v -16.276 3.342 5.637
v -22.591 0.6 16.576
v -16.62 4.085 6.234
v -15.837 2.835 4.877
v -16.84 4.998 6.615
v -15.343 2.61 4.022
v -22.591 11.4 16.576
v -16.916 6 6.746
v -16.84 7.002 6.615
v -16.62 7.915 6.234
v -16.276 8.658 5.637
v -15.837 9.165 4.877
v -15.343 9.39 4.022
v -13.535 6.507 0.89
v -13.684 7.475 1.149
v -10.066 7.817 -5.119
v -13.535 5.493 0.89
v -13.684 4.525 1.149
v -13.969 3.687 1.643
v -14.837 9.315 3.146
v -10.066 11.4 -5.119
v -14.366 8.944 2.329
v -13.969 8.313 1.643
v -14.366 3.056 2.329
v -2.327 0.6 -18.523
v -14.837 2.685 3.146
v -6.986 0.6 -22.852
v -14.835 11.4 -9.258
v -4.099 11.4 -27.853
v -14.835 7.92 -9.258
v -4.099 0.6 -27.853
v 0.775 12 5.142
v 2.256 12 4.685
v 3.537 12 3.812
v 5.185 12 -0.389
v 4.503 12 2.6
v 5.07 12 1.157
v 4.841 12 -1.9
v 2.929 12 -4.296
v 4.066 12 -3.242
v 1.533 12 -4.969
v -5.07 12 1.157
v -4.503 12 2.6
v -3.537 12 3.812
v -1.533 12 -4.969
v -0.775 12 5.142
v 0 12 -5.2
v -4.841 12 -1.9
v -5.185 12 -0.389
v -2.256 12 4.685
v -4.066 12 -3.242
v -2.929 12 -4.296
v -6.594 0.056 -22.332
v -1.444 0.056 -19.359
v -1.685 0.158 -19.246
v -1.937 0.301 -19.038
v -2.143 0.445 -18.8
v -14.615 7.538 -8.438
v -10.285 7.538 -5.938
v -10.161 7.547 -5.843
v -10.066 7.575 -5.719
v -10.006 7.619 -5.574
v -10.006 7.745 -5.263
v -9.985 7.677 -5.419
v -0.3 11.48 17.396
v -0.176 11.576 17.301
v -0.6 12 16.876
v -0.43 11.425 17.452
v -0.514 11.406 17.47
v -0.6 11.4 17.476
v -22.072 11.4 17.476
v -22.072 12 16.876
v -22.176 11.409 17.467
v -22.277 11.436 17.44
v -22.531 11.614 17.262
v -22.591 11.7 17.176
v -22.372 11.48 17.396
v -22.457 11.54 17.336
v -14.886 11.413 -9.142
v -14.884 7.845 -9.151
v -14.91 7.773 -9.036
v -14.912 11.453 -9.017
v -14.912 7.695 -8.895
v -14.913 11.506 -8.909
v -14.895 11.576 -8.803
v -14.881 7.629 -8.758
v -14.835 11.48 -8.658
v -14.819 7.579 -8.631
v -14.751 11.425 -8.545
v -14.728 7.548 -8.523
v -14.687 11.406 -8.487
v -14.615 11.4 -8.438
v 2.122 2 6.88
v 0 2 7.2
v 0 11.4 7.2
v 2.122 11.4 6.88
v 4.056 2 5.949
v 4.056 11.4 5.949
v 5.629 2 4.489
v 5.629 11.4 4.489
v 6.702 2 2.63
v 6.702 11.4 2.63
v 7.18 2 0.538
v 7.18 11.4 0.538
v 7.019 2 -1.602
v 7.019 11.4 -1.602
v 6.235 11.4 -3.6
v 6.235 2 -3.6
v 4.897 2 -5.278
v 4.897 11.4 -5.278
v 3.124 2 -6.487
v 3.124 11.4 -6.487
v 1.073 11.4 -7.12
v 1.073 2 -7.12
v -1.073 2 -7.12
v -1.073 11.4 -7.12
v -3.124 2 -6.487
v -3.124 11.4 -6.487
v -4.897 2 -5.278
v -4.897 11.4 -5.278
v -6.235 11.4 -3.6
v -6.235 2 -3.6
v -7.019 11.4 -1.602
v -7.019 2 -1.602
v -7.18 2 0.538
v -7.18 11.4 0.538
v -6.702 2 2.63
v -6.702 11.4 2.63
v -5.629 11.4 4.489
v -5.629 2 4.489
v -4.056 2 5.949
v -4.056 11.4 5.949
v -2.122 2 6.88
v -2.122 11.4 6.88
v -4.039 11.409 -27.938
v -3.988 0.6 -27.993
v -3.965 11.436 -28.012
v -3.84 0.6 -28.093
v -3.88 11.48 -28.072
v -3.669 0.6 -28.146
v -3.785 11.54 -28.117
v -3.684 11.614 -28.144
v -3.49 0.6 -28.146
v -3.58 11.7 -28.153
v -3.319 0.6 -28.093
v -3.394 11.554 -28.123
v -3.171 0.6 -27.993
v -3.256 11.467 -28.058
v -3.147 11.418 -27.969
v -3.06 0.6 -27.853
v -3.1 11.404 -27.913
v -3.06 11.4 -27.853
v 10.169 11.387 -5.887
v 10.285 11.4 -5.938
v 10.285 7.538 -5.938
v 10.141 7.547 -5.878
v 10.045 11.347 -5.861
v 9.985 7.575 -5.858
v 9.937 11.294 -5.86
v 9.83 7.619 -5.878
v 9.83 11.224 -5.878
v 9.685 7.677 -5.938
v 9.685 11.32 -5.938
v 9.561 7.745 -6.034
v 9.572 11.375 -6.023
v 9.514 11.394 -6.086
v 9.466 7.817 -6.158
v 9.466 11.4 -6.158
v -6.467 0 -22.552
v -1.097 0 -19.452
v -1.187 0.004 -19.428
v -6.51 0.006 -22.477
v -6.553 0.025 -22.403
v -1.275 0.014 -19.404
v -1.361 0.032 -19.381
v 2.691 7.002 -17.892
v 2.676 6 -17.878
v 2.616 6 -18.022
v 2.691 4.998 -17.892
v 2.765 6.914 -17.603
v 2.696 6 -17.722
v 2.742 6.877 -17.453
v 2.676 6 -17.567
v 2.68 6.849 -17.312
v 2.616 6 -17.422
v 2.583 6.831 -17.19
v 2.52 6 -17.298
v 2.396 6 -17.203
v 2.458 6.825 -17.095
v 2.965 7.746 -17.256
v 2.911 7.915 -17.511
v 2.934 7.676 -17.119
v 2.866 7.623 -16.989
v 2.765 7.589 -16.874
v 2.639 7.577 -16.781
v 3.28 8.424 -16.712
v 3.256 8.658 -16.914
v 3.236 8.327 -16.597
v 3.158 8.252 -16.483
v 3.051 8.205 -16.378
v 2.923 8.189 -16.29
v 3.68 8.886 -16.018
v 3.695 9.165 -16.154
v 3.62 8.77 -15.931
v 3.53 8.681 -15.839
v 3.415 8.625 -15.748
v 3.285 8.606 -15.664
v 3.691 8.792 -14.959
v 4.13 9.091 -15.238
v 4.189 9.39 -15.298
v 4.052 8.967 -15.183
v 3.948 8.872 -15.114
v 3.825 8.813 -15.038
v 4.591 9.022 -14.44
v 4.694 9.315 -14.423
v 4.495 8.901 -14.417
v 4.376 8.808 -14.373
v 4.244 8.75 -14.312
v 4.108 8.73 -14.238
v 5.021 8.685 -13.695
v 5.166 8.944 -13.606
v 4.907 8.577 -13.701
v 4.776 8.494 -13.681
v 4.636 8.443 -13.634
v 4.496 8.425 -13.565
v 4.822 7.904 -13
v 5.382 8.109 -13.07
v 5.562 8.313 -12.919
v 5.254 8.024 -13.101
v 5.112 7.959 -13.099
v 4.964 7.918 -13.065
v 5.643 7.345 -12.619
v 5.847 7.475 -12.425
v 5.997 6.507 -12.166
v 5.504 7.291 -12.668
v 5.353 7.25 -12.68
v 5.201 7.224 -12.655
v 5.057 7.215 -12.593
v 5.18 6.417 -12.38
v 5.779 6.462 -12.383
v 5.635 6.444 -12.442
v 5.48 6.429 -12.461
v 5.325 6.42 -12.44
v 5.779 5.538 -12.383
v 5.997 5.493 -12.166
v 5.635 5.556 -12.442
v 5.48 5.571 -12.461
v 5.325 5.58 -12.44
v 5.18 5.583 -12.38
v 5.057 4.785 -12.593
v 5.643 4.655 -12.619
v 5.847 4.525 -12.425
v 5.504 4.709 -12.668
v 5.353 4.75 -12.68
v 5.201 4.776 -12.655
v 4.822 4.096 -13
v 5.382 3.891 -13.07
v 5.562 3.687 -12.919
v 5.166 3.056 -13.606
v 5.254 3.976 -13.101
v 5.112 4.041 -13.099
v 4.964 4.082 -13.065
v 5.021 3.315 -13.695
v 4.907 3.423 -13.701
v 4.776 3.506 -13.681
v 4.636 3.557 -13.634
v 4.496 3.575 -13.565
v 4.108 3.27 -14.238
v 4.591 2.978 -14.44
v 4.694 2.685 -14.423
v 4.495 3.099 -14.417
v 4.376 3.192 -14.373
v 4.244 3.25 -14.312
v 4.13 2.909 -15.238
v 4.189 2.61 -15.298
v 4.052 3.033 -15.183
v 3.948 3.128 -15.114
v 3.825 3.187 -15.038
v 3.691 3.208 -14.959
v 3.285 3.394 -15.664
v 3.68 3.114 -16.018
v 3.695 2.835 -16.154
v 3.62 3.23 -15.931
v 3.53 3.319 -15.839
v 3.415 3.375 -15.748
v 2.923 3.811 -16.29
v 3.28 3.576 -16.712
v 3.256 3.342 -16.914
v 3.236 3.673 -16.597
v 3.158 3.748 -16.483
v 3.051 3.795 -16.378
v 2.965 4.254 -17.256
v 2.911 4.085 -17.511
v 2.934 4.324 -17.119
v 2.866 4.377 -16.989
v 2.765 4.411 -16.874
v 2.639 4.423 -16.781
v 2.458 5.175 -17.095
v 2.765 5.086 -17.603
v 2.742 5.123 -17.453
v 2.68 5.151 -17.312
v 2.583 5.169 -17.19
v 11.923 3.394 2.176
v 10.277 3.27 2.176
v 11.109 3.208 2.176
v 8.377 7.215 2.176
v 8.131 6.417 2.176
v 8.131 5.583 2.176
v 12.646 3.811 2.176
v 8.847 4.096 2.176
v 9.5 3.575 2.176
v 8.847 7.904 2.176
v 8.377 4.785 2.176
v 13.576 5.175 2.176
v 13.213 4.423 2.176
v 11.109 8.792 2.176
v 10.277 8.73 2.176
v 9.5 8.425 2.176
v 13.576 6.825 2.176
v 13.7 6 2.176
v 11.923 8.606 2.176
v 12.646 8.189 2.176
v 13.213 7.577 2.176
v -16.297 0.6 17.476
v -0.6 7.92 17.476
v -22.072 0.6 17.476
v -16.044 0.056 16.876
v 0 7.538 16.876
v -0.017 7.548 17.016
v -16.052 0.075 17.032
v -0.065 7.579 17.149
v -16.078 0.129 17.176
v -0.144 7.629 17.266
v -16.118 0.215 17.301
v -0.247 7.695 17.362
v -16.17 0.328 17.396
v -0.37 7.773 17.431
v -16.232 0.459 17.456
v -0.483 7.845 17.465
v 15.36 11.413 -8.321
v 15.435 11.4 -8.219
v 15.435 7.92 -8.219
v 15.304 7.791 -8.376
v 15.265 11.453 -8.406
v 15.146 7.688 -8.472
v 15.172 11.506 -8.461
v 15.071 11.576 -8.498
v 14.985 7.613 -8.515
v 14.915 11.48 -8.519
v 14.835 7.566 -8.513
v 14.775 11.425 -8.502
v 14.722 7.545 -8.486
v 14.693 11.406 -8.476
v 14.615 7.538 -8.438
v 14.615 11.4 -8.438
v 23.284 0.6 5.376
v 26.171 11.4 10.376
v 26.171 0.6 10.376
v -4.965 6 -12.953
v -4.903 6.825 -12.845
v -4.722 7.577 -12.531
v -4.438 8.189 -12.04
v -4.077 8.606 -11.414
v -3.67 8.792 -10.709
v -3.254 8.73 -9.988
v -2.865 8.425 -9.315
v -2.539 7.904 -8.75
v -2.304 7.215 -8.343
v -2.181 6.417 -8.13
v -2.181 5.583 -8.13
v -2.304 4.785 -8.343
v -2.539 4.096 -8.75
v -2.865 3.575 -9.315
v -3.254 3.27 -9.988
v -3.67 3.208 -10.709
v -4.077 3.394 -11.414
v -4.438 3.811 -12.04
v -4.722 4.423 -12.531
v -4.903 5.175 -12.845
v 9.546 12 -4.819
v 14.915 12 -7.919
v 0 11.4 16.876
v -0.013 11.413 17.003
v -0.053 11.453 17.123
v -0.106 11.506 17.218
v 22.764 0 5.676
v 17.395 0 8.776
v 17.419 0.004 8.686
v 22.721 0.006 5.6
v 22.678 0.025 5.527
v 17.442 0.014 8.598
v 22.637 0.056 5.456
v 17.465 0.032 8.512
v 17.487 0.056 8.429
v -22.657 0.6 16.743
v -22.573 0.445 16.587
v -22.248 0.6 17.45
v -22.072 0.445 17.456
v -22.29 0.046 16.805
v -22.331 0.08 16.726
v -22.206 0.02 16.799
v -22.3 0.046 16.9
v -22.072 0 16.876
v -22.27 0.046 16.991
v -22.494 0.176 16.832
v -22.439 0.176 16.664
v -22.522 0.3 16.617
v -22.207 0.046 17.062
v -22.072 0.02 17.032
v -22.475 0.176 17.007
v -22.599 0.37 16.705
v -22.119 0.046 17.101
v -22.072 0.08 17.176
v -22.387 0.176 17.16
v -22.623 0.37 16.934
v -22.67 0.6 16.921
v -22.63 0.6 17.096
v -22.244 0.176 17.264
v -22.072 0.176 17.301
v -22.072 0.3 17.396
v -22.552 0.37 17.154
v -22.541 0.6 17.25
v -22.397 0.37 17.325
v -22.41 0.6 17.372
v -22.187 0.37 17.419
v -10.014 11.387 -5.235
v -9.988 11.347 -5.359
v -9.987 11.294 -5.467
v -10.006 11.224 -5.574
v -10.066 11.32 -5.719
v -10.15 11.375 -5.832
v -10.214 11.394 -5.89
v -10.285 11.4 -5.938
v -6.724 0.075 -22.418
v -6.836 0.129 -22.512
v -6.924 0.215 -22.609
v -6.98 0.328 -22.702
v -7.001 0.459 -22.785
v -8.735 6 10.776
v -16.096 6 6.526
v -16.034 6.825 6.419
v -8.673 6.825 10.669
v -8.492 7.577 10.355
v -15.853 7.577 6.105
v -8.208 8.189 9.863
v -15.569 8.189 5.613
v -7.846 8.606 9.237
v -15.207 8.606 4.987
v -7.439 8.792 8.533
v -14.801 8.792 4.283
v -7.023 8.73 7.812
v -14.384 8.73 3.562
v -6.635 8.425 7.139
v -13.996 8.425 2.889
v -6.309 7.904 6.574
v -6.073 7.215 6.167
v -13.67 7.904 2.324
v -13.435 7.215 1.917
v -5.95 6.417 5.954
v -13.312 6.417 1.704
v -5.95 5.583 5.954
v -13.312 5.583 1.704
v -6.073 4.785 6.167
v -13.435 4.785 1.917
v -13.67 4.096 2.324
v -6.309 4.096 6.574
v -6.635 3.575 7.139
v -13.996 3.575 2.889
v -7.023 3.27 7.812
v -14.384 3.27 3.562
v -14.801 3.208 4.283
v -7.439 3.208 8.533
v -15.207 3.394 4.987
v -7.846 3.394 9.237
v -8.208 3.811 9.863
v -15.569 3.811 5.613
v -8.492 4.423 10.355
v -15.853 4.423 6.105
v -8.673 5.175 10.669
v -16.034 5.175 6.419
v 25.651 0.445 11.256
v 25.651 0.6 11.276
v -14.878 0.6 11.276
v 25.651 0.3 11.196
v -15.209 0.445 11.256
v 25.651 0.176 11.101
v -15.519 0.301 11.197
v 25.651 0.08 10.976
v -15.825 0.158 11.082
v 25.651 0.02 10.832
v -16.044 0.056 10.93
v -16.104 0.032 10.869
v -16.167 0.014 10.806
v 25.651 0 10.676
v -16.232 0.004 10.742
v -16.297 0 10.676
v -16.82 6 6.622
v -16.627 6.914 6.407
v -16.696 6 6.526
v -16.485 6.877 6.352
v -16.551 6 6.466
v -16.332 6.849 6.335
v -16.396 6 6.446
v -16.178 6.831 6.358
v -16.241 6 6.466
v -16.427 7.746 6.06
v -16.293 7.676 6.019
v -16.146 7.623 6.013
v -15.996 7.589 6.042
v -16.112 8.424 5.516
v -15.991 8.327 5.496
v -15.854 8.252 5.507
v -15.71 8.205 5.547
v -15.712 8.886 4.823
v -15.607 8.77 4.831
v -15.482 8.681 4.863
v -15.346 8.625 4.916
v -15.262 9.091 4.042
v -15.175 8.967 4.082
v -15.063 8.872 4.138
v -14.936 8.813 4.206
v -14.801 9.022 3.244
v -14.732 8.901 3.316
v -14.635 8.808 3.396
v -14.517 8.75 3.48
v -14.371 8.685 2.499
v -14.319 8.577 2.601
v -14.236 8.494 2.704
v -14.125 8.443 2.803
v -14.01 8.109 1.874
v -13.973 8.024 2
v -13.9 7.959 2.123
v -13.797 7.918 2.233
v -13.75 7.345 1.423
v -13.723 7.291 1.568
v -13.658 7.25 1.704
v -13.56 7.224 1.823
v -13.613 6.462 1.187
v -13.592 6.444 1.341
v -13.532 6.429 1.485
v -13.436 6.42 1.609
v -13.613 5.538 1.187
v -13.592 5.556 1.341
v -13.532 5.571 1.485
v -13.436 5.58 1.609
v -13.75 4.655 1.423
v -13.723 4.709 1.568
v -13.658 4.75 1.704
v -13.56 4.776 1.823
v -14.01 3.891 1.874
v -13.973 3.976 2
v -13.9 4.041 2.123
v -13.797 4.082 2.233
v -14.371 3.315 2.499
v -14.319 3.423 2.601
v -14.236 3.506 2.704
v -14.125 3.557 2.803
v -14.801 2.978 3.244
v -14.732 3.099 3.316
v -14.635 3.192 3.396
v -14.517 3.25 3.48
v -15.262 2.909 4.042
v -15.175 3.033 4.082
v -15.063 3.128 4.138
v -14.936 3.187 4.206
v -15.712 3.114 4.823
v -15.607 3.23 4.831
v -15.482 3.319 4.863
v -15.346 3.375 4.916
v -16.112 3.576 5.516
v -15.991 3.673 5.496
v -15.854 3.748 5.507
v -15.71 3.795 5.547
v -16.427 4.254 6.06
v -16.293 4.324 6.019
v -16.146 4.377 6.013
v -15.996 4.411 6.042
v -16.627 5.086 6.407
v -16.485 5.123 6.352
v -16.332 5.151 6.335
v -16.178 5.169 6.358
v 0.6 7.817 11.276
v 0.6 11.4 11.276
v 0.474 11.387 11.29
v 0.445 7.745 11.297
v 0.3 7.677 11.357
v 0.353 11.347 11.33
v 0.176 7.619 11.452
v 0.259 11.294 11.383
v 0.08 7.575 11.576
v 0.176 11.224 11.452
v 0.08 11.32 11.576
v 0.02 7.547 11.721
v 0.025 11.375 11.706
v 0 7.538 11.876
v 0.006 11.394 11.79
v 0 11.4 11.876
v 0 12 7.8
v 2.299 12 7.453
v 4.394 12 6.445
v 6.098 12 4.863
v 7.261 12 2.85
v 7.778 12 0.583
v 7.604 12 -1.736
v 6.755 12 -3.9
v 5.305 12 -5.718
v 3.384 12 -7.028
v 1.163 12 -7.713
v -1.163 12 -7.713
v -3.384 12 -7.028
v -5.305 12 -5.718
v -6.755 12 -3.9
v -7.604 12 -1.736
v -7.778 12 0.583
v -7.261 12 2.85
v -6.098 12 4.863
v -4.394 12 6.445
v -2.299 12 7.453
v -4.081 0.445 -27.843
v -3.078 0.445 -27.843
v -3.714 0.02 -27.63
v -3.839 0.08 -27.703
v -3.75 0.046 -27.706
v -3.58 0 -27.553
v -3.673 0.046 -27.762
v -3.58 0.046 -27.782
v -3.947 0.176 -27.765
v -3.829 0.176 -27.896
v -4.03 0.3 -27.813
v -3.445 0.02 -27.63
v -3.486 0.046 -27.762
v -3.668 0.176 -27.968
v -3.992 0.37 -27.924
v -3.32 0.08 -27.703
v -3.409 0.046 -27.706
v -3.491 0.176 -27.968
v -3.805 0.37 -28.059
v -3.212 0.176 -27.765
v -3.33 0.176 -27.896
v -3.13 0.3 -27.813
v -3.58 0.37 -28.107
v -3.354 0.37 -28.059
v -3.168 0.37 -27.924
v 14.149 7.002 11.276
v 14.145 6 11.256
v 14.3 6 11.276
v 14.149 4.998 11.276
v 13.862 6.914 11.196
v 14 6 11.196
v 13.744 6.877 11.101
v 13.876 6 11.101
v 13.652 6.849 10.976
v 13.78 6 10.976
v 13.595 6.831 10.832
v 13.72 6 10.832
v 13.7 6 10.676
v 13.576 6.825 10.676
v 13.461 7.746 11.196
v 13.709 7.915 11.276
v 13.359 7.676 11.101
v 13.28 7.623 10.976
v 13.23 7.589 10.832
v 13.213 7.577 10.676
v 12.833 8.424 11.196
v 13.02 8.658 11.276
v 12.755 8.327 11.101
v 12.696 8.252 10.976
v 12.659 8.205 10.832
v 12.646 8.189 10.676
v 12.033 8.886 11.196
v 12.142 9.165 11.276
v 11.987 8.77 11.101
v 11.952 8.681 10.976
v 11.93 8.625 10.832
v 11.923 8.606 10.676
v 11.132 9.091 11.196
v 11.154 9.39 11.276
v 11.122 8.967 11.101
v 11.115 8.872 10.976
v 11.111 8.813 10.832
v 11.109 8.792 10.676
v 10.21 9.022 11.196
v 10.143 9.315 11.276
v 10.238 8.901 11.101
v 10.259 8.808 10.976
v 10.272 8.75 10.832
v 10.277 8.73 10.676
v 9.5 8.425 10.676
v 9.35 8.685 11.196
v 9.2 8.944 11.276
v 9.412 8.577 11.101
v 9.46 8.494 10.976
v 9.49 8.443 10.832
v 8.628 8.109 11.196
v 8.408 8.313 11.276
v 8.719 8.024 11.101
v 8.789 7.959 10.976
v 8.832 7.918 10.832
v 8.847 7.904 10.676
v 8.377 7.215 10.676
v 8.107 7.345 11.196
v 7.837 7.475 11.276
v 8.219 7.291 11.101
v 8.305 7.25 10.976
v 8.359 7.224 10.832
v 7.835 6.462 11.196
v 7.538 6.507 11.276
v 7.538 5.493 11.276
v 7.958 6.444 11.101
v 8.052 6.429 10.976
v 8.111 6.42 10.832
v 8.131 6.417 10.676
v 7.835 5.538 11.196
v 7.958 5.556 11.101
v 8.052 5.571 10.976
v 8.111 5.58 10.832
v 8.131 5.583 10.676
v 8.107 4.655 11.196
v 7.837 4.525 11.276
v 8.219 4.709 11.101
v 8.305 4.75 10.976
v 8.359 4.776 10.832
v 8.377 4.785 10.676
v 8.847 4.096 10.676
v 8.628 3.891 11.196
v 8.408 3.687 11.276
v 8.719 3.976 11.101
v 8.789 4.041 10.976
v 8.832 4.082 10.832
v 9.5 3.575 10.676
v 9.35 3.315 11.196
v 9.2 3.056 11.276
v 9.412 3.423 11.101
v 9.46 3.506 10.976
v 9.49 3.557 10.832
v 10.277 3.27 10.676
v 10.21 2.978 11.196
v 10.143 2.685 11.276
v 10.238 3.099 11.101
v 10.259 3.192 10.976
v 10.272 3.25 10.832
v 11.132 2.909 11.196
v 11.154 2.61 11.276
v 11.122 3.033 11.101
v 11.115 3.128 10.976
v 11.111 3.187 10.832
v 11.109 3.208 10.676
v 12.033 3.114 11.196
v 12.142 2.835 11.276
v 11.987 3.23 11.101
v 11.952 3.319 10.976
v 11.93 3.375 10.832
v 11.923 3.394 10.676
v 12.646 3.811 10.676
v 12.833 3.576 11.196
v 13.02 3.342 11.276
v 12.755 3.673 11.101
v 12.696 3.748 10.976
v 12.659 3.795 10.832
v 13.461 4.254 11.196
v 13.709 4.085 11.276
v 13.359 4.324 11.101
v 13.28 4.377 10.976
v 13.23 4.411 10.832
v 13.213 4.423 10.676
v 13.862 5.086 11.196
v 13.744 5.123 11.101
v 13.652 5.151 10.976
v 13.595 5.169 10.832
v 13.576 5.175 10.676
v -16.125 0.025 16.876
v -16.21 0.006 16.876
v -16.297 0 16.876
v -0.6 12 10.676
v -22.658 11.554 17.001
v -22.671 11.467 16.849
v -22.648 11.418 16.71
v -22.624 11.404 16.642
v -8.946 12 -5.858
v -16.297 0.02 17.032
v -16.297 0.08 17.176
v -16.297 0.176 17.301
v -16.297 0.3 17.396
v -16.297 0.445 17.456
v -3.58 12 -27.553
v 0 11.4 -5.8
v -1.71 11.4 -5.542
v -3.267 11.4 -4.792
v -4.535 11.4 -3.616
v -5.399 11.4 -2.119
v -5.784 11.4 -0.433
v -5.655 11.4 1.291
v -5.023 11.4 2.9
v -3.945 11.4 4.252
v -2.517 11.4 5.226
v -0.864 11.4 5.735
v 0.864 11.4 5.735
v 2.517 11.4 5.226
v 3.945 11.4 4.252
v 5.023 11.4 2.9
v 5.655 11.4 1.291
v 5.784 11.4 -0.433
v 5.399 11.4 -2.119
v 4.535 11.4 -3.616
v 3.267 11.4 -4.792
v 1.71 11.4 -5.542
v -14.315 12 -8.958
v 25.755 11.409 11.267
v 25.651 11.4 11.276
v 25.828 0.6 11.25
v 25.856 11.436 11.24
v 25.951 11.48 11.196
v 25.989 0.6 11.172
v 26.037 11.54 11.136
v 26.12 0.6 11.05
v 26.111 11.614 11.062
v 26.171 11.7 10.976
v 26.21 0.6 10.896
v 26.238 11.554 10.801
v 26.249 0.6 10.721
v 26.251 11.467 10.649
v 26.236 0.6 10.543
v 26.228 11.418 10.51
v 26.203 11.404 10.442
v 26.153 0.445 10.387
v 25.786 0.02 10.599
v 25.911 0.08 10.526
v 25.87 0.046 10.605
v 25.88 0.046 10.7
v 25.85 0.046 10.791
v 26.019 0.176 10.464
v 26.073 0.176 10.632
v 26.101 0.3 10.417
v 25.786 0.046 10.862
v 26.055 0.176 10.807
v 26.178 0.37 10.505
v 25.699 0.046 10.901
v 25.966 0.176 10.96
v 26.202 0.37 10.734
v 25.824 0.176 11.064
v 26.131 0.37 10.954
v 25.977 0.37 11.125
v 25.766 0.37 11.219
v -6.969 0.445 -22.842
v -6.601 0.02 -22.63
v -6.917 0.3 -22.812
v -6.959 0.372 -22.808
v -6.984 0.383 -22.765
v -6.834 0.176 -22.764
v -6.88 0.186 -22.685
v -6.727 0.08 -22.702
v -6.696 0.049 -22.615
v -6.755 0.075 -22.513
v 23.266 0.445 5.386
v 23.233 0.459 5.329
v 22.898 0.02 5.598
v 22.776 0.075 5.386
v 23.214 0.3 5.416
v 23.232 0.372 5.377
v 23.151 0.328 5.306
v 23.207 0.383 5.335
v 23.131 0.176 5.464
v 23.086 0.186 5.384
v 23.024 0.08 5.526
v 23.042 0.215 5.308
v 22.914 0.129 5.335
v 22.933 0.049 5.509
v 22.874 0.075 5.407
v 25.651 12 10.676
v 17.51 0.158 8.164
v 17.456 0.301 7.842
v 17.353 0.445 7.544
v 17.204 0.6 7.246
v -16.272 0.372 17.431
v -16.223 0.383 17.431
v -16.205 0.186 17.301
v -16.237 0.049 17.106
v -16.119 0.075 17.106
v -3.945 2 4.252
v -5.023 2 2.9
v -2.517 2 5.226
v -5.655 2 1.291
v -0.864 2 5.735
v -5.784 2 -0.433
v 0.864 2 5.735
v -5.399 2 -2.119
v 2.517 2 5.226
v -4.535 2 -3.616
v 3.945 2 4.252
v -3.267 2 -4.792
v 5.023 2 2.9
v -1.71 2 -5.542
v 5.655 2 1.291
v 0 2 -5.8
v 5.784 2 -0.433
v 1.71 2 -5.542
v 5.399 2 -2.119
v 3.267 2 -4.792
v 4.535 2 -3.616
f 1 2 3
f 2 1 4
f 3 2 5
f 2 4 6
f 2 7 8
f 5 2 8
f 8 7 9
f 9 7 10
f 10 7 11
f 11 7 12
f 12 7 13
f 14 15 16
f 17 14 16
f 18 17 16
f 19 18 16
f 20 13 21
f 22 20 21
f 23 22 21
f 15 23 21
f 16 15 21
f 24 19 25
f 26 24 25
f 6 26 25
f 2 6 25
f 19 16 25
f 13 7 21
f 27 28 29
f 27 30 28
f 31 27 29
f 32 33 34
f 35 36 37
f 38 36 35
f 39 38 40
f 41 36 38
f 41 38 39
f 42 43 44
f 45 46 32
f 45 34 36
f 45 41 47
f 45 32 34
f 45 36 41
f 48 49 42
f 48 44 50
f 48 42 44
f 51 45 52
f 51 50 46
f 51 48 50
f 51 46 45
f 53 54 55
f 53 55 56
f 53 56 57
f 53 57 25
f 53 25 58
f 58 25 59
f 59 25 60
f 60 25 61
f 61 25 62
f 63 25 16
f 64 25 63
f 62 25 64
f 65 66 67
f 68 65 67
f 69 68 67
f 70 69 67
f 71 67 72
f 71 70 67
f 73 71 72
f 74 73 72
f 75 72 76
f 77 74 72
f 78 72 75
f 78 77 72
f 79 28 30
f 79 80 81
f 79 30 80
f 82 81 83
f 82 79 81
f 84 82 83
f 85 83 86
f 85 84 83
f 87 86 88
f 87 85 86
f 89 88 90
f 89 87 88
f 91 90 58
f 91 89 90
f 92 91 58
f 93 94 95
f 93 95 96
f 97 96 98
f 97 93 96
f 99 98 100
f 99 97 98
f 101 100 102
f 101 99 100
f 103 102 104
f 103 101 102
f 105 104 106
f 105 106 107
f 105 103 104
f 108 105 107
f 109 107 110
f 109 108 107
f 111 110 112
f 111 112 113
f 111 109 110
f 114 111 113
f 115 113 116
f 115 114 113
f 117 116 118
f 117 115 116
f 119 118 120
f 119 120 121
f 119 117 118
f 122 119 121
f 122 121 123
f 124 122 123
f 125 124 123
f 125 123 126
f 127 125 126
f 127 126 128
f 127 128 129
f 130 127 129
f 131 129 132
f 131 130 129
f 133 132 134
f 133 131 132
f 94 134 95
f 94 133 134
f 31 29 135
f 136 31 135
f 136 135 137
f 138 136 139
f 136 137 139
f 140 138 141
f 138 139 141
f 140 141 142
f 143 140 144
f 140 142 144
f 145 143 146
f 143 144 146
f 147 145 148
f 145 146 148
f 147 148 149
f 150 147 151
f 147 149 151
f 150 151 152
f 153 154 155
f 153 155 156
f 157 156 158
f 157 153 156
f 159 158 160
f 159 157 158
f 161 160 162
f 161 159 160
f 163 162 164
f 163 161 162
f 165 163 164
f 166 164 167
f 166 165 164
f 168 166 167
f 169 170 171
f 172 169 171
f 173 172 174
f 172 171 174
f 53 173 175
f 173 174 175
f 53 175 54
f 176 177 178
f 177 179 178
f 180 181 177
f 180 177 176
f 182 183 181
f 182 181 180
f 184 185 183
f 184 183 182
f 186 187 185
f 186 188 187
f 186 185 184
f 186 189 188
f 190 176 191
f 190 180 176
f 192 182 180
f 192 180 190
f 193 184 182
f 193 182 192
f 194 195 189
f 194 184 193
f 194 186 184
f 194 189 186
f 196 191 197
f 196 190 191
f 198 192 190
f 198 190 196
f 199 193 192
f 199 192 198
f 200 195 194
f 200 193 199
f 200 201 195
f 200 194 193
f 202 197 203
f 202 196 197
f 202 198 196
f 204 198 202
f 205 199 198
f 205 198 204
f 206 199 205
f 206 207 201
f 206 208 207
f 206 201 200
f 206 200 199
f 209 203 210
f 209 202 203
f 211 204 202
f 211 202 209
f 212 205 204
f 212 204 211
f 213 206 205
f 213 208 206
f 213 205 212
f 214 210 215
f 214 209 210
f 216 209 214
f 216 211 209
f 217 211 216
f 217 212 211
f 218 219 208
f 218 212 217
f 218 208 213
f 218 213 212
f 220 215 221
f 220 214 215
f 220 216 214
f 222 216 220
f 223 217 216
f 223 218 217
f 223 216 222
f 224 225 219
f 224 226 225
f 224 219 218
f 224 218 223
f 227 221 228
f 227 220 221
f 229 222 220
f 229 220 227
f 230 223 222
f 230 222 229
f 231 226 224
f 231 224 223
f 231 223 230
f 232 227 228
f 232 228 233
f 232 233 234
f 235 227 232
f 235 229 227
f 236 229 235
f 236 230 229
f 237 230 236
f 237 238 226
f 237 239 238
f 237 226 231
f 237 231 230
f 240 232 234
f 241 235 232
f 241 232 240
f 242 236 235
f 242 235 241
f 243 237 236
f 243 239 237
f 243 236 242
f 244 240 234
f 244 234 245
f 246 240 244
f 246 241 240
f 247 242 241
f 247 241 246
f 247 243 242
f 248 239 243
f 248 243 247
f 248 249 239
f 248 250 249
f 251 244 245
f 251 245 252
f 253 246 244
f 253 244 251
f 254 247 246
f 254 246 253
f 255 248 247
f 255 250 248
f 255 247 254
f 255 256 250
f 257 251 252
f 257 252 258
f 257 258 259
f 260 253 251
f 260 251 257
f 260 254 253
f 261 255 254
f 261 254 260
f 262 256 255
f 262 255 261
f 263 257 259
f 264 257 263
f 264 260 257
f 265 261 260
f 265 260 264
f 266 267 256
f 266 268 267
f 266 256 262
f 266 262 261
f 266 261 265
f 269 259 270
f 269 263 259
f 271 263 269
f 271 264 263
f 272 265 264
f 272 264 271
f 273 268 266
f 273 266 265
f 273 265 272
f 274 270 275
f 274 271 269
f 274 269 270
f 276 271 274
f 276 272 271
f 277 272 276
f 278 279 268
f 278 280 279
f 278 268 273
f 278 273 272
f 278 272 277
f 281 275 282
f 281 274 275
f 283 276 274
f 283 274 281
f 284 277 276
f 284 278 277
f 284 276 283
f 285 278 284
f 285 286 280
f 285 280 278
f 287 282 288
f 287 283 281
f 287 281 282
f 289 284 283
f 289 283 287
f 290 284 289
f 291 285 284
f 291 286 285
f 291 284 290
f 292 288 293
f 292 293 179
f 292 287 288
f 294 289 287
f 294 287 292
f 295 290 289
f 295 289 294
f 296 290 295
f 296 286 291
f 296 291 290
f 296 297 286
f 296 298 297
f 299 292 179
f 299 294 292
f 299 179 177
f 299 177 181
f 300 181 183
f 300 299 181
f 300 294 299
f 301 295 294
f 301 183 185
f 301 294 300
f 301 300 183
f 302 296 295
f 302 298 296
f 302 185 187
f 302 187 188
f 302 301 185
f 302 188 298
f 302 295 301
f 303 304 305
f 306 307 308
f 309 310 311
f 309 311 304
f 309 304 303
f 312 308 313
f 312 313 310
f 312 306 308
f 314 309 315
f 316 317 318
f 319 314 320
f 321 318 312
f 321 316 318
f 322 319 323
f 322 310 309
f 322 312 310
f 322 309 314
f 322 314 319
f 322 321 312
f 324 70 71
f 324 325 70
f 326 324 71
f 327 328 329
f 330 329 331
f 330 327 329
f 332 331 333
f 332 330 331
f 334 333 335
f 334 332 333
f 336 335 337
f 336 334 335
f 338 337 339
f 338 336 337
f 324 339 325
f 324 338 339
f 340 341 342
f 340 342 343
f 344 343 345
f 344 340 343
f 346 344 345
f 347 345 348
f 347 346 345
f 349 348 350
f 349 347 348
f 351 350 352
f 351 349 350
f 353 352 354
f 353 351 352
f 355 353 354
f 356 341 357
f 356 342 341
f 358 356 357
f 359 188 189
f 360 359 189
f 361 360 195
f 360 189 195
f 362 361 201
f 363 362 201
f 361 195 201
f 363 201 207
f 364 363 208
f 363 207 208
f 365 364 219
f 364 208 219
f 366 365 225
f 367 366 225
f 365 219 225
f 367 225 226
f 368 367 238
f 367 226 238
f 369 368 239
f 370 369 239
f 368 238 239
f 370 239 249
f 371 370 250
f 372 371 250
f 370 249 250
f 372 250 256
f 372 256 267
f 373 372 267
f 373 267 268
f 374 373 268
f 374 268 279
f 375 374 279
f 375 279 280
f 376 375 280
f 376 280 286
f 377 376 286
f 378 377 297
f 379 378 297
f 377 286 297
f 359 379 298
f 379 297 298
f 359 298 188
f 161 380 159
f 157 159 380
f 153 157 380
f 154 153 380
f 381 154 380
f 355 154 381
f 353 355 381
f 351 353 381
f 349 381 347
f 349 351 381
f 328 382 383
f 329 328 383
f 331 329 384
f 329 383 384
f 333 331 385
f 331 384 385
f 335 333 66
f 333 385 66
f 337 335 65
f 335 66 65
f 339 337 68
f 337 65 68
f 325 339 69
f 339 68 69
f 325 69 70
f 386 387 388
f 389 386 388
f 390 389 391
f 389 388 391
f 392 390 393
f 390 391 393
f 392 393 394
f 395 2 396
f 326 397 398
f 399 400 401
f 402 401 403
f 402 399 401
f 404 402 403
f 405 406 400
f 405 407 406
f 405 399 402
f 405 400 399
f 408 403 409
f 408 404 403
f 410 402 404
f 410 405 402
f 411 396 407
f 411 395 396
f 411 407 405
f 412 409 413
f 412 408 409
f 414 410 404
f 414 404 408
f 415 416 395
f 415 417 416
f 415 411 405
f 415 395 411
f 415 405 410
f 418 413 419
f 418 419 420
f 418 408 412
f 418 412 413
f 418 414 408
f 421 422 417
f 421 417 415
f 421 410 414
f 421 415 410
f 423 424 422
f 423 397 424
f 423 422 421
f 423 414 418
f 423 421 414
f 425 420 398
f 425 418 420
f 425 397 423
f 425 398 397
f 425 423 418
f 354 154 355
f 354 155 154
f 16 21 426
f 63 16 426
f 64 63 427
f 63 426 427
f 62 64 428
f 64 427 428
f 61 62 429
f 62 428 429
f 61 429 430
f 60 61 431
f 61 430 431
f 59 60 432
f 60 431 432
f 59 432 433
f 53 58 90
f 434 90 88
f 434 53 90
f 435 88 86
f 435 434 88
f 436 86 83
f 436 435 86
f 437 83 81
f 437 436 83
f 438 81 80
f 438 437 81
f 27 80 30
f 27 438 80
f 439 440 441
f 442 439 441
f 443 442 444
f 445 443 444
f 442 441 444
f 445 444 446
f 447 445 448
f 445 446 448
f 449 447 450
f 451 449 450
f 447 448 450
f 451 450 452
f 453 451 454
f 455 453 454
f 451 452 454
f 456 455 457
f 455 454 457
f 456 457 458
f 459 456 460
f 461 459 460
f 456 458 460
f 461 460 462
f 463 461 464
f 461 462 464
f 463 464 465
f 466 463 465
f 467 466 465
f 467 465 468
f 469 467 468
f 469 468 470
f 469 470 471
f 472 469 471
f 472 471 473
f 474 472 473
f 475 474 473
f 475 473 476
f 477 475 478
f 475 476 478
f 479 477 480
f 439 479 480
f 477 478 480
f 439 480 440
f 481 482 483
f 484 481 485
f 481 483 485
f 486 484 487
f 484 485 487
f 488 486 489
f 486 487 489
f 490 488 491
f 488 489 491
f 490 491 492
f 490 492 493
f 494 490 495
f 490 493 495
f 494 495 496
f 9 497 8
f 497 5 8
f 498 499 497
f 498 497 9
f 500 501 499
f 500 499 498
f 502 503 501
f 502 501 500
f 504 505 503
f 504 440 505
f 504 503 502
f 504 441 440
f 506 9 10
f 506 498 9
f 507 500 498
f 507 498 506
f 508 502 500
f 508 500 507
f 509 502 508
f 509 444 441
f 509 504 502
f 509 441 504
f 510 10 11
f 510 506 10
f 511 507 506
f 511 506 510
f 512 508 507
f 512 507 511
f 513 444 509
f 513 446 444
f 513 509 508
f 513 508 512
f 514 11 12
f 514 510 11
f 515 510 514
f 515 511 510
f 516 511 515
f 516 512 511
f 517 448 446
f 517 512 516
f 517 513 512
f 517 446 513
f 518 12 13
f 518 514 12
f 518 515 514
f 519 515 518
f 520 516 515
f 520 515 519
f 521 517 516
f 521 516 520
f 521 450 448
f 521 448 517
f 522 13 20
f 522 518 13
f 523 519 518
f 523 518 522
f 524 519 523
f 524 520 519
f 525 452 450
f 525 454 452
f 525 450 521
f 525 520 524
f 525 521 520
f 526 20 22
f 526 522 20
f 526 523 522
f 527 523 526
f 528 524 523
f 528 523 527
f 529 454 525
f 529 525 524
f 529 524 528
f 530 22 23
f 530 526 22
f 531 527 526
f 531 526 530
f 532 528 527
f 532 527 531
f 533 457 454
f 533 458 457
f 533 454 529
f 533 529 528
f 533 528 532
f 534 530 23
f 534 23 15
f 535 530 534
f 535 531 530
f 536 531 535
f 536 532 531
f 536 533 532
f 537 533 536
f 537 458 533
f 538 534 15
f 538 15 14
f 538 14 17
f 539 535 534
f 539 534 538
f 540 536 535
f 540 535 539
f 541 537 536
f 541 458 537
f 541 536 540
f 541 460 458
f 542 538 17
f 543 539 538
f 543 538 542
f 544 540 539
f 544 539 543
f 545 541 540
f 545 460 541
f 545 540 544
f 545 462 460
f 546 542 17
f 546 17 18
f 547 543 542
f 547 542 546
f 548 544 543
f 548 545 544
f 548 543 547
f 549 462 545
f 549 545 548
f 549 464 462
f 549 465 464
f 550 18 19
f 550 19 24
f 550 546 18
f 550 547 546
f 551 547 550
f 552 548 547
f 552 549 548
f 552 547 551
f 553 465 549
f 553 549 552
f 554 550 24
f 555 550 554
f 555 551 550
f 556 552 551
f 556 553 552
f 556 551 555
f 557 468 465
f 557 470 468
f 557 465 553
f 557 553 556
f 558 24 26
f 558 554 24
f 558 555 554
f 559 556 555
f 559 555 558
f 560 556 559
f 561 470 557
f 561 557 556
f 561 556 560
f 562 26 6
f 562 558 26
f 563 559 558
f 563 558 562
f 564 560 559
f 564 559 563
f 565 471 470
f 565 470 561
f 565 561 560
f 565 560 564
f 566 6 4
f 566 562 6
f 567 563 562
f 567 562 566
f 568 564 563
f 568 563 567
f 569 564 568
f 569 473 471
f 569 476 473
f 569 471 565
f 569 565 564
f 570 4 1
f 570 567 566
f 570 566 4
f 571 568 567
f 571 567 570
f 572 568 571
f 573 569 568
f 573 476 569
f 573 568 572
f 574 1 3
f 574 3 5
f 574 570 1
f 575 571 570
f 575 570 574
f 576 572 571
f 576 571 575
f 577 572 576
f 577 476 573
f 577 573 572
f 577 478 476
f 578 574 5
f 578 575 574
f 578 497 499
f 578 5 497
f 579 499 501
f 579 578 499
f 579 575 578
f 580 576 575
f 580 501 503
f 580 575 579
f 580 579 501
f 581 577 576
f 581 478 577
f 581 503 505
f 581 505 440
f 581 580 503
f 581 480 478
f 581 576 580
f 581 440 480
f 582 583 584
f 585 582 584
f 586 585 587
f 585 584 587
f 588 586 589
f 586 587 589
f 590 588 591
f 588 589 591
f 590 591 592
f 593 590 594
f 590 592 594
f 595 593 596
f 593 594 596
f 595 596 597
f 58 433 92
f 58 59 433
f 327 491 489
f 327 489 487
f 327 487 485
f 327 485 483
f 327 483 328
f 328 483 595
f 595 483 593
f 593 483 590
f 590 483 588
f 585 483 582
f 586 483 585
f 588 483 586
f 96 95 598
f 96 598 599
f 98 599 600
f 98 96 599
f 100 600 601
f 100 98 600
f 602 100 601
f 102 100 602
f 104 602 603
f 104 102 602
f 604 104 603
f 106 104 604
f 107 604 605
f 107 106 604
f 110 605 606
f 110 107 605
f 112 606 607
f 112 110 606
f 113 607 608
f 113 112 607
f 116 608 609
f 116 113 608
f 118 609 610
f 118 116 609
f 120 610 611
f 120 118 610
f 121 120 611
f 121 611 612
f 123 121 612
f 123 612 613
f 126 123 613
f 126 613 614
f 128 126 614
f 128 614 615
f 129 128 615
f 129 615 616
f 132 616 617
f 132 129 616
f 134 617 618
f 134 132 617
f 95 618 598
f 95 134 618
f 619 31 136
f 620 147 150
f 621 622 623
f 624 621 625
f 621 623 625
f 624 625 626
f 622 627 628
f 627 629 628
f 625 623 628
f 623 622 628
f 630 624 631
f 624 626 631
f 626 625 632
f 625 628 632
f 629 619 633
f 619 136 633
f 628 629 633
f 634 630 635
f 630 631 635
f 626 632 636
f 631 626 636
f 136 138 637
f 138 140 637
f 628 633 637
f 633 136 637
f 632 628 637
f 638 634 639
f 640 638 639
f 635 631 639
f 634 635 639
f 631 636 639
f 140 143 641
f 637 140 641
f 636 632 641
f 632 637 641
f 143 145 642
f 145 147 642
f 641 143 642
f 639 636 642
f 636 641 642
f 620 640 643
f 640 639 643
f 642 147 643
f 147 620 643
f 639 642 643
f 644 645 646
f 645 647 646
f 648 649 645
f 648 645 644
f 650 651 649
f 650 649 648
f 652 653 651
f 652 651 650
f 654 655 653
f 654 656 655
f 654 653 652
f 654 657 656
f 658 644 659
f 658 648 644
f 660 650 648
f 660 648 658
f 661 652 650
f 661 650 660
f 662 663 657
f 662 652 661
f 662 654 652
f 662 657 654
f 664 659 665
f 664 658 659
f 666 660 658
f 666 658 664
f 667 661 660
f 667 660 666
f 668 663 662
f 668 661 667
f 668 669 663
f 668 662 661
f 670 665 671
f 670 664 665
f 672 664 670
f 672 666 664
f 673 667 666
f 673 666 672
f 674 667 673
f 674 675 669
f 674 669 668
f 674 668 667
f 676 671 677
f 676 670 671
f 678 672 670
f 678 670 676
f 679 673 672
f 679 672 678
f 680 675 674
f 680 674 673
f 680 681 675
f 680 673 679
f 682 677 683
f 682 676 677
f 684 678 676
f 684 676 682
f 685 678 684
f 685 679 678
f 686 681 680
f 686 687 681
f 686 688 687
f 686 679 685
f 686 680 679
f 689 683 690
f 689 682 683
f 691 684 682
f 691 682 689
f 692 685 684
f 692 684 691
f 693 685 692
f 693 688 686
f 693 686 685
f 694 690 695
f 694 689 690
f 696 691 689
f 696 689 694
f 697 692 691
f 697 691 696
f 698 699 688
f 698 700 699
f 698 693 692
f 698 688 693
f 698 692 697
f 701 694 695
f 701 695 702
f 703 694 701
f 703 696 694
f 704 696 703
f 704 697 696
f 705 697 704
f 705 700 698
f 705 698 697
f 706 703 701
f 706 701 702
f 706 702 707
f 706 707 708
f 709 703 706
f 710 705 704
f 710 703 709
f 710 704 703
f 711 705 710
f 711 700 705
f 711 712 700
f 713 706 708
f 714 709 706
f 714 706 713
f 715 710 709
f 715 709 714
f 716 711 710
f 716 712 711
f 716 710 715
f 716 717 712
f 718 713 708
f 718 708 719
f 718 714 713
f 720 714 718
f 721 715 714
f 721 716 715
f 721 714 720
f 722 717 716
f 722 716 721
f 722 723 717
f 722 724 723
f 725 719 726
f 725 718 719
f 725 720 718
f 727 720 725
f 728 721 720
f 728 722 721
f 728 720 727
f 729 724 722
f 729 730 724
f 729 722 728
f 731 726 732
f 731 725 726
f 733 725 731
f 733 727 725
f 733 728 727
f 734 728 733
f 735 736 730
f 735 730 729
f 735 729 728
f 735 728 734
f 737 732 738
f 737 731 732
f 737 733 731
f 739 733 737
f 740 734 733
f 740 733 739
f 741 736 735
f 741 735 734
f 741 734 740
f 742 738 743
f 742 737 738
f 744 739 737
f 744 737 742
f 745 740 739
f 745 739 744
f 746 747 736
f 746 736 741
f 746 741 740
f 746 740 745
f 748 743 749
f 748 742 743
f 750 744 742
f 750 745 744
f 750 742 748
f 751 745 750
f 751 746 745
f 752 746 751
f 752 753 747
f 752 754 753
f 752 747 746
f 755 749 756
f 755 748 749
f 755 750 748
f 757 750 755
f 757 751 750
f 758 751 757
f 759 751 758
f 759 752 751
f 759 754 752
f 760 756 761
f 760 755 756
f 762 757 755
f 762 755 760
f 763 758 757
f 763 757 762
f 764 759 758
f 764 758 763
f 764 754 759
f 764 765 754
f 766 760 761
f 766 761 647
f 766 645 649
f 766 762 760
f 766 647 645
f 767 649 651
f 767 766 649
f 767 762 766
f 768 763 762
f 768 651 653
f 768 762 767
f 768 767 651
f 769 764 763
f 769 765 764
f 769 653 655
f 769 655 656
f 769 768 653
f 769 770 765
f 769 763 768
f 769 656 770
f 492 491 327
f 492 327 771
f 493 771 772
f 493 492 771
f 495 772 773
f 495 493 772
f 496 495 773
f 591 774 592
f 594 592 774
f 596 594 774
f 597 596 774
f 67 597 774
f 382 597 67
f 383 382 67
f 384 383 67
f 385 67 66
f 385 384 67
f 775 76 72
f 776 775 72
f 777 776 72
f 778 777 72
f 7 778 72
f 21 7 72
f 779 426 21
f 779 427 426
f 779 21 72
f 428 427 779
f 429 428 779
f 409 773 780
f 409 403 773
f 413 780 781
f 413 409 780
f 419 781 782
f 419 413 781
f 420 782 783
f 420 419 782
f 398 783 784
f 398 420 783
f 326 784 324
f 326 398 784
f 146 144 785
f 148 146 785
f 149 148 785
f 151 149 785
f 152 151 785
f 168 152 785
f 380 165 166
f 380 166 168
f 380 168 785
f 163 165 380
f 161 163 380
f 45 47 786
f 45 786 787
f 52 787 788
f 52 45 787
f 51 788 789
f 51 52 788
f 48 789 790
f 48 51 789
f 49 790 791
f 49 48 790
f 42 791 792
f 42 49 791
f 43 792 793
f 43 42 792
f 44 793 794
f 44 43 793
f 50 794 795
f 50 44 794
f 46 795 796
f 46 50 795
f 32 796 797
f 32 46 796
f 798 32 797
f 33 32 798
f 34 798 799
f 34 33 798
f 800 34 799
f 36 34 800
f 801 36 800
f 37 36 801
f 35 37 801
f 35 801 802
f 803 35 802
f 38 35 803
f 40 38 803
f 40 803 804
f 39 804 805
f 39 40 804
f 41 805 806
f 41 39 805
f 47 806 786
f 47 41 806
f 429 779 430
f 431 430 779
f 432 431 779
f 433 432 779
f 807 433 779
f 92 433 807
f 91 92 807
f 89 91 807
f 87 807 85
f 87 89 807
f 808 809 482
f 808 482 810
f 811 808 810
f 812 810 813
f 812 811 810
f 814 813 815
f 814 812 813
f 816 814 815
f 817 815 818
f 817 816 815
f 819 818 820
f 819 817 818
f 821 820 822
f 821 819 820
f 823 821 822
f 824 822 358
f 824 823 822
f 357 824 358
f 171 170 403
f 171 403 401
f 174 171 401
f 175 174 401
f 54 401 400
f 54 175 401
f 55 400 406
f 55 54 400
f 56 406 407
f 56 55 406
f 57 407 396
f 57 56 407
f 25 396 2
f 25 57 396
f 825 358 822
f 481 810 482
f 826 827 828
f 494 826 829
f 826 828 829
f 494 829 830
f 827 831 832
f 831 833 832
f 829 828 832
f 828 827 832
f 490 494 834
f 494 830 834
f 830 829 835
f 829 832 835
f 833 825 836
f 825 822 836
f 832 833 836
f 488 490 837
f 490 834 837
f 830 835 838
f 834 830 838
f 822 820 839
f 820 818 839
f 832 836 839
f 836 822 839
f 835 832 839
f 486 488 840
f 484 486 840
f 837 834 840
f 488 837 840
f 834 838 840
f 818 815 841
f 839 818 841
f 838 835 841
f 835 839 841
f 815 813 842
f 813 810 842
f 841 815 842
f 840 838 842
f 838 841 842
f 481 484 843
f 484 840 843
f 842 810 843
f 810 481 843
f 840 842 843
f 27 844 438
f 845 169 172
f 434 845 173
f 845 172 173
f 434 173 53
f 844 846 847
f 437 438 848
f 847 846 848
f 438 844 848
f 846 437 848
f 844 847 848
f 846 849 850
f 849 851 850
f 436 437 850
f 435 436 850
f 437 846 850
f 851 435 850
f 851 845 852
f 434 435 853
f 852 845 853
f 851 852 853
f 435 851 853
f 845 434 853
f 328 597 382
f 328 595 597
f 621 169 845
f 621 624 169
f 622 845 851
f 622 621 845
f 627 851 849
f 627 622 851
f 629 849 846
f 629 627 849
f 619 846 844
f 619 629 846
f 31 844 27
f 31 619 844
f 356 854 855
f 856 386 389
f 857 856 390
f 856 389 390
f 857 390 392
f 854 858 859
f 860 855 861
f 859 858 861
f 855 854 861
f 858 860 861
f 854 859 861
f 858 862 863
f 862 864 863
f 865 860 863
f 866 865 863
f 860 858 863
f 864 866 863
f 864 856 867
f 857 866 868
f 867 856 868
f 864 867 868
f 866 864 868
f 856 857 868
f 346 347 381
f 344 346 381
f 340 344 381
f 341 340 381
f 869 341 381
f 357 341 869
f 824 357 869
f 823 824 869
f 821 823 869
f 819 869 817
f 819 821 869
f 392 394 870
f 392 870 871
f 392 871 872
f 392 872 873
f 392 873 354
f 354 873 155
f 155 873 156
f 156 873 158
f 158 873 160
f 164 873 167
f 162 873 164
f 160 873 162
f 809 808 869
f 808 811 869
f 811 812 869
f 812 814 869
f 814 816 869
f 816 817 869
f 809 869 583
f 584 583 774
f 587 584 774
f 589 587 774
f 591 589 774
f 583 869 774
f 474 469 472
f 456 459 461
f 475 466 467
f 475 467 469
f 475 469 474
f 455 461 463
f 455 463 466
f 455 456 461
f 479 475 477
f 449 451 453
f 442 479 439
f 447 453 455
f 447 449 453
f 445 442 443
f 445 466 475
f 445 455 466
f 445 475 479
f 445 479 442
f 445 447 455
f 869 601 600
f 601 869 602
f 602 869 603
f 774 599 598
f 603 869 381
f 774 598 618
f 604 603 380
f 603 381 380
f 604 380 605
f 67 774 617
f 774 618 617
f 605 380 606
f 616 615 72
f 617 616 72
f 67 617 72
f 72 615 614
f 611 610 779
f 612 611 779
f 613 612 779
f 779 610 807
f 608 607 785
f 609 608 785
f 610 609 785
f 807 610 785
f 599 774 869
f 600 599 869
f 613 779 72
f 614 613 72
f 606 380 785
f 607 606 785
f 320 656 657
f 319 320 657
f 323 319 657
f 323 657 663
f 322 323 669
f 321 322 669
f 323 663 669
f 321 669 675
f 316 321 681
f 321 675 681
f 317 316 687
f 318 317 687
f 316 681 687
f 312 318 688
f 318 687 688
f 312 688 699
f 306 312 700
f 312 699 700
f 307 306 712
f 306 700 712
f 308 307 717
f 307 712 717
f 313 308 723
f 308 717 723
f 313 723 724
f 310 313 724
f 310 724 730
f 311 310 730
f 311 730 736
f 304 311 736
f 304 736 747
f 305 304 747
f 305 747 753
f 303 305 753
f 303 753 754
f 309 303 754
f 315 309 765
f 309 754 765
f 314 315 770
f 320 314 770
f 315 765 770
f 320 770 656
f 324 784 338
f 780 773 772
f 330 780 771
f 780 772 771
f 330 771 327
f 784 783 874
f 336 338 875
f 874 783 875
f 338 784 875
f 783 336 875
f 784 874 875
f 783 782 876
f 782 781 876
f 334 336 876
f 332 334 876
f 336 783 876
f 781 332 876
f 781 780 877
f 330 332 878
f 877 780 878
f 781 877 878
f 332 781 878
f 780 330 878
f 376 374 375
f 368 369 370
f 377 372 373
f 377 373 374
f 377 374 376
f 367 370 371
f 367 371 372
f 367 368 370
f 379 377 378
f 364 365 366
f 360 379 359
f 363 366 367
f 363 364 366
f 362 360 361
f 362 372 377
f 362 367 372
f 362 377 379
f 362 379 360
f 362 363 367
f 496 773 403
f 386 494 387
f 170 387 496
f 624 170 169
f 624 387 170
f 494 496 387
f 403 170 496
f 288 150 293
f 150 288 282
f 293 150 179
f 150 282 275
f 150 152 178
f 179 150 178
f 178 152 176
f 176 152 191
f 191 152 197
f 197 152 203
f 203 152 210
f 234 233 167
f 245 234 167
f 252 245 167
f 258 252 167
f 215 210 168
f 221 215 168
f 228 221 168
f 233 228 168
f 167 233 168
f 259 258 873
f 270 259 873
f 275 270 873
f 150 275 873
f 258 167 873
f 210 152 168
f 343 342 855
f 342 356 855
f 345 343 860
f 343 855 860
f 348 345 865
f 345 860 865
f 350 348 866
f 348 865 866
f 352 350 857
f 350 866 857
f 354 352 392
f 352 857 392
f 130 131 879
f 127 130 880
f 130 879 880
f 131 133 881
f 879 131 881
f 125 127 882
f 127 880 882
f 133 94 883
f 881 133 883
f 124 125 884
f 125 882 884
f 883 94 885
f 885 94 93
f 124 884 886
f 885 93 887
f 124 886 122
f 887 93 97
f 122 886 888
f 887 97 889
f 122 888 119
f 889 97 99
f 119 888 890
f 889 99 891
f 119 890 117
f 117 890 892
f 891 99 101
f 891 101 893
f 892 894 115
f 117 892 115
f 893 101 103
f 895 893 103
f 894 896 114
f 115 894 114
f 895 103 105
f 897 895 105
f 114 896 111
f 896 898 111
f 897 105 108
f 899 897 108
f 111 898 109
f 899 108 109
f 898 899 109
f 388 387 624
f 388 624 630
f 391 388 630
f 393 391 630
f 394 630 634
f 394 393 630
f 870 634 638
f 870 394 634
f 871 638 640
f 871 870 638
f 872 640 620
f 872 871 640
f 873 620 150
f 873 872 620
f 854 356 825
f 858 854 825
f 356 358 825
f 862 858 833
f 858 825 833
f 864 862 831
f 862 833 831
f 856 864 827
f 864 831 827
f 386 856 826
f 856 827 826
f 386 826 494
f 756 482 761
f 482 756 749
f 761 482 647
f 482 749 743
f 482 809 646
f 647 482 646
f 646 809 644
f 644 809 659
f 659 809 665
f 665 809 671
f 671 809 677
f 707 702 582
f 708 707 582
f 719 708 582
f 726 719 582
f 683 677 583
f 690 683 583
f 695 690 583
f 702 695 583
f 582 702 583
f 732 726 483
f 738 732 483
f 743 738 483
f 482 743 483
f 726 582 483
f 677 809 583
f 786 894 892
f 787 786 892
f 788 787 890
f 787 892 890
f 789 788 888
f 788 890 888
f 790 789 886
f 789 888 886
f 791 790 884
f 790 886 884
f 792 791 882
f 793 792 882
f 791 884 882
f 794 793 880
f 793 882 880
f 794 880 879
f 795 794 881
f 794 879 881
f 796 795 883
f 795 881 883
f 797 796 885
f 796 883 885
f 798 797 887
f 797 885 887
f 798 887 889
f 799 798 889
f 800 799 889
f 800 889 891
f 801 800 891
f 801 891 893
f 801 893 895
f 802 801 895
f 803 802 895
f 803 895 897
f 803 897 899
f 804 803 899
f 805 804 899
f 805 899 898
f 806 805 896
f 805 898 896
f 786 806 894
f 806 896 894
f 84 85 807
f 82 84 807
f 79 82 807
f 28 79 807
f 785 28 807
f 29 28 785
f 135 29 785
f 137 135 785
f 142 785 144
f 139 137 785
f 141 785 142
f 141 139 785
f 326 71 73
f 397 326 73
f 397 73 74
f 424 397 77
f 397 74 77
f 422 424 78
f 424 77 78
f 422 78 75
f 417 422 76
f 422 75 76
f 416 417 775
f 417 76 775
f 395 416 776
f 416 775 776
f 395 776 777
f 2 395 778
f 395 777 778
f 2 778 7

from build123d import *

# Parameters (mm, degrees)
SKETCH1_R           = 7.2
BOSS_EXTRUDE1_DEPTH = 12
SKETCH2_R           = 7.2
BOSS_EXTRUDE2_DEPTH = 2
SKETCH3_R           = 2.7999999999999985
CUT_EXTRUDE1_DEPTH  = 9.1
CUT_EXTRUDE3_DEPTH  = 50.58533021602103
SKETCH8_R           = 5.8
BOSS_EXTRUDE3_DEPTH = 10
CIRPATTERN2_COUNT   = 3
CHAMFER2_SIZE       = 0.6
FILLET3_R           = 0.6


with BuildPart() as part:
    # Sketch1 → Boss-Extrude1 (new body)
    with BuildSketch(Plane(origin=(0, 0, 0), x_dir=(1, 0, 0), z_dir=(0, 1, 0))):
        Polygon((-23.110809387790948, -17.47636535456504), (-9.76561885940777, 5.638182677282097), (-15.134976362871324, 8.738182677282033), (-3.579571668975892, 28.752730709129278), (9.765618859407624, 5.638182677282344), (15.13497636287113, 8.738182677282364), (26.690381056766807, -11.276365354564588), (0, -11.27636535456458), (0, -17.476365354564578), align=None)
        with Locations(Location((0, 0, 0), (0, 0, 270))):
            Circle(SKETCH1_R, mode=Mode.SUBTRACT)
    extrude(amount=BOSS_EXTRUDE1_DEPTH)

    # Sketch2 → Boss-Extrude2 (add)
    with BuildSketch(Plane.XZ):
        with Locations(Location((0, 0, 0), (0, 0, 270))):
            Circle(SKETCH2_R)
    extrude(amount=-BOSS_EXTRUDE2_DEPTH)

    # Sketch3 → Cut-Extrude1 (cut)
    with BuildSketch(Plane.XY.offset(11.27636535456458)):
        with Locations((10.899999999999999, 6)):
            Circle(SKETCH3_R)
    cut_extrude1 = extrude(amount=-CUT_EXTRUDE1_DEPTH, mode=Mode.SUBTRACT)

    # Sketch7 → Cut-Extrude3 (cut, through all)
    with BuildSketch(Plane.XY.offset(11.27636535456458)):
        with BuildLine():
            Line((13.43570957044416, 0.5621532777800846), (-23.41303642284339, -16.620699172297943))
            ThreePointArc((-23.41303642284339, -16.620699172297943), (-31.38659271550747, -13.718562020522187), (-28.484455563731718, -5.7450057278581115))
            Line((-28.484455563731718, -5.7450057278581115), (8.364290429555835, 11.437846722219916))
            ThreePointArc((8.364290429555835, 11.437846722219916), (16.337846722219915, 8.535709570444162), (13.43570957044416, 0.5621532777800846))
        make_face()
    cut_extrude3 = extrude(amount=CUT_EXTRUDE3_DEPTH, mode=Mode.SUBTRACT)

    # Sketch8 → Boss-Extrude3 (add)
    with BuildSketch(Plane(origin=(0, 2, 0), x_dir=(1, 0, 0), z_dir=(0, 1, 0))):
        with Locations(Location((0, 0, 0), (0, 0, 90))):
            Circle(SKETCH8_R)
    extrude(amount=BOSS_EXTRUDE3_DEPTH)

    # CirPattern2: Cut-Extrude1, Cut-Extrude3 ×3 about axis
    cirpattern2_axis = Axis((-8e-16, 0, -3.09e-15), (0, 1, 0))
    add([cut_extrude1.rotate(cirpattern2_axis, i * 360 / CIRPATTERN2_COUNT) for i in range(1, CIRPATTERN2_COUNT)], mode=Mode.SUBTRACT)
    add([cut_extrude3.rotate(cirpattern2_axis, i * 360 / CIRPATTERN2_COUNT) for i in range(1, CIRPATTERN2_COUNT)], mode=Mode.SUBTRACT)

    # Chamfer2
    chamfer2_edges = [part.edges().sort_by_distance(p)[0] for p in [
        (13.345190528383403, 12, 11.276365354564584),
        (20.91267870981897, 12, 1.2690913386411111),
        (12.450297611139376, 12, -7.188182677282353),
        (2.2e-15, 12, -7.2),
        (3.0930235952158665, 12, -17.19545669320581),
        (-9.357274015923608, 12, -18.745456693205654),
        (-12.450297611139547, 12, -7.1881826772820645),
        (-16.43821412359936, 12, 5.919091338641472),
        (-11.555404693895474, 12, 17.47636535456481),
        (-1.07e-15, 12, 5.8),
        (0, 12, 14.37636535456458),
    ]]
    chamfer(chamfer2_edges, length=CHAMFER2_SIZE)

    # Fillet3
    fillet3_edges = [part.edges().sort_by_distance(p)[0] for p in [
        (-5.316211260430414, 0, -25.744782702294316),
        (-11.093913607378132, 3.76875701994284, -15.737508686370697),
        (-4.3681721001530995, 0, -21.186834695459314),
        (7.134086350709061, 0, -10.196130684117296),
        (24.953741465312213, 0, 8.268417347729613),
        (5.263065017397029, 0, 11.276365354564584),
        (-19.63753020488185, 0, 17.47636535456497),
        (-23.110809387790948, 5.700000000000001, 17.47636535456504),
        (-9.76561885940777, 9.468757019942823, -5.638182677282097),
        (-15.134976362871324, 9.468757019942839, -8.738182677282033),
        (-3.579571668975892, 5.700000000000001, -28.752730709129278),
        (9.765618859407624, 9.46875701994278, -5.638182677282344),
        (15.13497636287113, 9.468757019942785, -8.738182677282364),
        (26.690381056766807, 5.7, 11.276365354564588),
        (0, 9.468757019942768, 11.27636535456458),
        (0, 9.468757019942766, 17.476365354564578),
        (8.099999999999996, 6, 11.27636535456458),
        (-8.082125510986373, 3.7687570199427665, 17.476365354564738),
        (-16.164251021972746, 0, 14.376365354564811),
        (-13.815618859407646, 6, 1.3766230933716486),
        (5.715618859407651, 6, -12.652988447936243),
        (19.176039118364372, 3.7687570199427864, -1.7388566681938666),
        (20.532423122125817, 0, 6.810469340894656),
        (-12.397151368106105, 0, -1.0802346704471155),
    ]]
    fillet(fillet3_edges, radius=FILLET3_R)


solid = part.part
